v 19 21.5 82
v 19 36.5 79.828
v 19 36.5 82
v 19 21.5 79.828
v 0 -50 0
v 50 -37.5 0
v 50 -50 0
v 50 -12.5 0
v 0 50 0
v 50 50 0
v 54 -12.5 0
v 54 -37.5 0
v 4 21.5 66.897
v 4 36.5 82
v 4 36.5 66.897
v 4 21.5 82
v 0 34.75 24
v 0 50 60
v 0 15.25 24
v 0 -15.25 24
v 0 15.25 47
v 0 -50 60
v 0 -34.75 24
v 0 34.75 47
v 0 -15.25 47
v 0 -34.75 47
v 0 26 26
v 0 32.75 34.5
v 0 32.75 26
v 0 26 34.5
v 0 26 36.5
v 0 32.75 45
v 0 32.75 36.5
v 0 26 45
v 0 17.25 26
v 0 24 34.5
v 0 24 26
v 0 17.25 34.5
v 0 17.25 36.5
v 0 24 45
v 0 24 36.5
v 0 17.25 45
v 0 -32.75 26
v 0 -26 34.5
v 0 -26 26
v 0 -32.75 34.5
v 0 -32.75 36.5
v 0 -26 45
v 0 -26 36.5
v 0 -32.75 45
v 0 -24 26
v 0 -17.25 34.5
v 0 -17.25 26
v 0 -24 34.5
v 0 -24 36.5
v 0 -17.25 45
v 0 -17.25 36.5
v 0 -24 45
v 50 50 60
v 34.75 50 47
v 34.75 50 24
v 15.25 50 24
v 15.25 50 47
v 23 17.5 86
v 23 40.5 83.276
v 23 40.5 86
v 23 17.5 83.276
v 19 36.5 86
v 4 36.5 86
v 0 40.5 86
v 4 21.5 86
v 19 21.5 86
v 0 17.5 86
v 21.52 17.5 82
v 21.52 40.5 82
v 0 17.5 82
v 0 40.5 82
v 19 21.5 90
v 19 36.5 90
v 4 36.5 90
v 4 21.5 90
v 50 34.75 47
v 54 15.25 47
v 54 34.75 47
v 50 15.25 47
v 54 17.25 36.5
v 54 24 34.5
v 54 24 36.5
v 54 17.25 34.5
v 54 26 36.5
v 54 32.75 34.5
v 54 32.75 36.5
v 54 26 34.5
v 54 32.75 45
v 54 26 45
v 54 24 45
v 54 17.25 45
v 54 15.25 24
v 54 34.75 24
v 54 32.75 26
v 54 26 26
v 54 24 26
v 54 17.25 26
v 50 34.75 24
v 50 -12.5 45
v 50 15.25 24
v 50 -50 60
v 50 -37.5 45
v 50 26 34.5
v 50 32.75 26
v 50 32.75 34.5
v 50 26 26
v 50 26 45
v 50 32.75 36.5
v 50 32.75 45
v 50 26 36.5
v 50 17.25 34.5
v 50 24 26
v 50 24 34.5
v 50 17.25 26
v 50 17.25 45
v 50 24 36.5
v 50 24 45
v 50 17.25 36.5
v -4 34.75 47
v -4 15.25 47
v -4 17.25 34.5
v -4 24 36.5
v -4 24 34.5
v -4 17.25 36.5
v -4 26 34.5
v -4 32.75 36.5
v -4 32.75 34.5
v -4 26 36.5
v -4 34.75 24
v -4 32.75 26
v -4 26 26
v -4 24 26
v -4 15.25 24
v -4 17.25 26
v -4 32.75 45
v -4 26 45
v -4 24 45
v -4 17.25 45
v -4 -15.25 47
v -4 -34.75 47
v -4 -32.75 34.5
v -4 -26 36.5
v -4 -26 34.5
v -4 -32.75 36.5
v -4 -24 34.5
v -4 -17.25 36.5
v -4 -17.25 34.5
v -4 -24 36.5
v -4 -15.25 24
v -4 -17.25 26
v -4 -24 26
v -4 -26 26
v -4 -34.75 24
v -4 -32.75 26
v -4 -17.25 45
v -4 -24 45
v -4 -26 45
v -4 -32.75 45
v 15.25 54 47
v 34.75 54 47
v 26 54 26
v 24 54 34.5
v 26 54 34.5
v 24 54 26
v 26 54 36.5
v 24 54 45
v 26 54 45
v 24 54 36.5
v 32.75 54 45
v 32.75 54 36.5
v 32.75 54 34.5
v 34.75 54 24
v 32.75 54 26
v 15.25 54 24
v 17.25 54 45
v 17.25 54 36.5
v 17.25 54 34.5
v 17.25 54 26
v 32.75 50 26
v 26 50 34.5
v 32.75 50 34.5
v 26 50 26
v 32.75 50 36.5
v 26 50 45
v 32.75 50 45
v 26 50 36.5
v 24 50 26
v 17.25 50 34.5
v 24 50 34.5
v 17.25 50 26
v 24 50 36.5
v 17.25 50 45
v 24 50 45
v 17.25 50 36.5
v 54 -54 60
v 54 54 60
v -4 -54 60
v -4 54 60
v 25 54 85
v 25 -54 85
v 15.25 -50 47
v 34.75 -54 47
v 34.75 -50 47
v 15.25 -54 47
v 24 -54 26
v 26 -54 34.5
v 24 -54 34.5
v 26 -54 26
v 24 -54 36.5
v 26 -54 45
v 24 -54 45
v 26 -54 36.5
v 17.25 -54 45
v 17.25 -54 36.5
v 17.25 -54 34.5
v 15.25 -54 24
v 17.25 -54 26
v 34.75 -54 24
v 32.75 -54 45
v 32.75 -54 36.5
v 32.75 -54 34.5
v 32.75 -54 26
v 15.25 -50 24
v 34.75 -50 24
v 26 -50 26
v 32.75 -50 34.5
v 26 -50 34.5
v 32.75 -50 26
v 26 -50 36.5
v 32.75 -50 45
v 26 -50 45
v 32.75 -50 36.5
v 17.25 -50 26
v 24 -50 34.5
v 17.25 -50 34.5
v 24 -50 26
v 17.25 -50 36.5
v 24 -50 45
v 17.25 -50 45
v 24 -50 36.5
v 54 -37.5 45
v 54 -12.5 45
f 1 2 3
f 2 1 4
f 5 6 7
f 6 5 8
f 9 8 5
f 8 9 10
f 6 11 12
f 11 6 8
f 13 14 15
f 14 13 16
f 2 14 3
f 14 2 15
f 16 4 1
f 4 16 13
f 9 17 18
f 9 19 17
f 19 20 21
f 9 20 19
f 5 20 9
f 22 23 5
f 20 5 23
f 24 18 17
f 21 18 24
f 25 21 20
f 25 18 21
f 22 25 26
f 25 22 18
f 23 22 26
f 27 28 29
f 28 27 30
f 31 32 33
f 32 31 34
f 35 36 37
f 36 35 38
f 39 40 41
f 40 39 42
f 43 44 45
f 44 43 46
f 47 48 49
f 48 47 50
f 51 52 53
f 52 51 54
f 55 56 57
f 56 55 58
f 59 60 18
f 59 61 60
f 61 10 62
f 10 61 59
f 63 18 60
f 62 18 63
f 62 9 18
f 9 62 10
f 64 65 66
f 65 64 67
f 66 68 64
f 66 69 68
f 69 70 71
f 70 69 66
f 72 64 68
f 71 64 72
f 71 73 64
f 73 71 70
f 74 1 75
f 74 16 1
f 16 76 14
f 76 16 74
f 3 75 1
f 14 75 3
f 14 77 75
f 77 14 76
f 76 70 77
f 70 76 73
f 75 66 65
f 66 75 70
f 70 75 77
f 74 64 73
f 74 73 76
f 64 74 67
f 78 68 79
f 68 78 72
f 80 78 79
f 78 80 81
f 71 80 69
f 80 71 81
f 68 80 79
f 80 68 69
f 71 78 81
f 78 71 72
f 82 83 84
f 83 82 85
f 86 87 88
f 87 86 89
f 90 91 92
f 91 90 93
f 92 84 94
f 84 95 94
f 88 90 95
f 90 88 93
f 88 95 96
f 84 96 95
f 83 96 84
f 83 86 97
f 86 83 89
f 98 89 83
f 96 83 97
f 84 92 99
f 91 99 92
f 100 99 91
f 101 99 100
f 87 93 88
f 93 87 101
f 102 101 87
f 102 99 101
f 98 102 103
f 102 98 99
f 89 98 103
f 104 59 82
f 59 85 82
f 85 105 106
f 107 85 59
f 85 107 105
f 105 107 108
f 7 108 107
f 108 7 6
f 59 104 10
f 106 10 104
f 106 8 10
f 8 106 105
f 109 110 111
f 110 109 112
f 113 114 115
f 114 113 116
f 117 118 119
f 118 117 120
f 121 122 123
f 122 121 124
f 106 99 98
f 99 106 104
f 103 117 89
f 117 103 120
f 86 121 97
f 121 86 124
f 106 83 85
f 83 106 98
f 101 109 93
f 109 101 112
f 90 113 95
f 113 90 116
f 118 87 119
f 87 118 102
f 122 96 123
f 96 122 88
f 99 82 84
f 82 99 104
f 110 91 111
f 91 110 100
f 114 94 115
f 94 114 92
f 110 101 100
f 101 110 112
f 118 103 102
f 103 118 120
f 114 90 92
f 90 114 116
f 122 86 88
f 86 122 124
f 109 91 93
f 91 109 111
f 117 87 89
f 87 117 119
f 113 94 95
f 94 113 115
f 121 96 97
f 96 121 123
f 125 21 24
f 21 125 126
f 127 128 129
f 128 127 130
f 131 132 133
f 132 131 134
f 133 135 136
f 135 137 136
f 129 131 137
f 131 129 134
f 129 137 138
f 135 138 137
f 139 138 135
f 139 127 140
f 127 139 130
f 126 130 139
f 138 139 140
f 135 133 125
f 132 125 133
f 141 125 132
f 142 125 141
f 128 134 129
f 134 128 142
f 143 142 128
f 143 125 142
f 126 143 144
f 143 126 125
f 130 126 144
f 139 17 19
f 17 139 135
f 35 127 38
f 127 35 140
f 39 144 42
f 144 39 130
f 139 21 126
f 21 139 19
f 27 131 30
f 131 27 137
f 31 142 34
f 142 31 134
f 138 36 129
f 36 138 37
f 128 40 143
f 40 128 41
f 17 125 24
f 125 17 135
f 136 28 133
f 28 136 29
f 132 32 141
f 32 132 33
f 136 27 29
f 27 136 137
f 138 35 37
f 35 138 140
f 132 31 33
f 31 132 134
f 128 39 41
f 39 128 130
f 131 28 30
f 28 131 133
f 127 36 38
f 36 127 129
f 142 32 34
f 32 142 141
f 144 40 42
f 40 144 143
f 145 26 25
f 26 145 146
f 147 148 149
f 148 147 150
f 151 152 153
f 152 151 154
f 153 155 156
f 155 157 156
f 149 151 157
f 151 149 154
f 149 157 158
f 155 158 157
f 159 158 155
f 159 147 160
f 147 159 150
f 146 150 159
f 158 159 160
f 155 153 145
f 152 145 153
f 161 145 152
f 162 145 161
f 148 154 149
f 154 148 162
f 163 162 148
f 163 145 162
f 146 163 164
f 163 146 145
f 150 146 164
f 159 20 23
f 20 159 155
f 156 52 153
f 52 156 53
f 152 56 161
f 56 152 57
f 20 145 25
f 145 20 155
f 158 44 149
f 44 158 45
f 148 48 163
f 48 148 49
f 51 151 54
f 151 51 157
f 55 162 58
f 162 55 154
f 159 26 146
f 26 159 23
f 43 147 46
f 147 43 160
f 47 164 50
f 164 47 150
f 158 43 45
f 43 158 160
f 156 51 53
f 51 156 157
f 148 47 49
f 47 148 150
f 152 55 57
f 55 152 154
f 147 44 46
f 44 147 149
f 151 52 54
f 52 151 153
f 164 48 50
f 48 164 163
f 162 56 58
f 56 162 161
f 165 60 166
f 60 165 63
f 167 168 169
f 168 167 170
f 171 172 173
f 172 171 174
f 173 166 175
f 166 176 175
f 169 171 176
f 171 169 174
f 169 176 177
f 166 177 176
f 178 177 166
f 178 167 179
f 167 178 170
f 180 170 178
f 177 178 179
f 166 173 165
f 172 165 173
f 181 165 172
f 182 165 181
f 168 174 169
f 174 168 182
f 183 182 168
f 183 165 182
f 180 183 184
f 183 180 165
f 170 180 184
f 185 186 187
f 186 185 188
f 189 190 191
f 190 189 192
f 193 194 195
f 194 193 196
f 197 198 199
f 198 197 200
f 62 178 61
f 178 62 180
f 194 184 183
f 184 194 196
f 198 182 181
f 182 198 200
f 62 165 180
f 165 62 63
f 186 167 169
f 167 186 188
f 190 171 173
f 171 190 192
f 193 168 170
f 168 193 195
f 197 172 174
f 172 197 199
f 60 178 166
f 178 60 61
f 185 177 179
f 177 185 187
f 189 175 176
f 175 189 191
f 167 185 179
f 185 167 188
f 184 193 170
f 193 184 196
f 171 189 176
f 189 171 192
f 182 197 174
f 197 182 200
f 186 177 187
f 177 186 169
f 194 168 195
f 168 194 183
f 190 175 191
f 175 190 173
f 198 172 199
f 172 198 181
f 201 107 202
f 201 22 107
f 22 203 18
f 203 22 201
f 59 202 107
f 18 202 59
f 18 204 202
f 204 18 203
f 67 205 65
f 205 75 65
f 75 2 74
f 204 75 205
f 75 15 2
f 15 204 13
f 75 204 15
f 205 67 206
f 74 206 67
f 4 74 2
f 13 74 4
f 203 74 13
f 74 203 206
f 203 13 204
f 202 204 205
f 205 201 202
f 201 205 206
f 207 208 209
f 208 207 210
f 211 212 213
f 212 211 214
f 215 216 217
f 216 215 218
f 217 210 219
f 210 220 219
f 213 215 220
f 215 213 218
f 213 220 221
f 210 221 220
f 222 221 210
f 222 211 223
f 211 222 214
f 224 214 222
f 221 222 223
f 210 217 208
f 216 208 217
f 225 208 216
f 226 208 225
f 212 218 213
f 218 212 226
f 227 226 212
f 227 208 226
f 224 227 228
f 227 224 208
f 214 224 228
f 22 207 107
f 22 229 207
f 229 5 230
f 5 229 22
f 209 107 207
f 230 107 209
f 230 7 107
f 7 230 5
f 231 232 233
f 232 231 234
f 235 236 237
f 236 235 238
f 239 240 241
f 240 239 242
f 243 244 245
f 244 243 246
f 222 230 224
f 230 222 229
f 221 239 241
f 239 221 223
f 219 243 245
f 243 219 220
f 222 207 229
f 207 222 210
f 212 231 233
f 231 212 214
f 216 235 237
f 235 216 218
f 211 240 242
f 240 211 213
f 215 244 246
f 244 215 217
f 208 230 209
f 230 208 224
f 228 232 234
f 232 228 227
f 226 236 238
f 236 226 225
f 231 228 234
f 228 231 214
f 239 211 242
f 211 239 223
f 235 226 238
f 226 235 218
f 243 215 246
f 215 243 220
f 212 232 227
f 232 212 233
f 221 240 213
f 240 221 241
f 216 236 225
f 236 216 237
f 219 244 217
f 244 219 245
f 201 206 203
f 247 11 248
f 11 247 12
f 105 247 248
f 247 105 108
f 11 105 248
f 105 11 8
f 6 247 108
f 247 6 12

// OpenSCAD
/* [Global] */

/* [Dimension] */
// front part of house
house_length = 100; 
// side of house
house_width = 50; 
// height of house (excluding roof)
house_height = 60; 
// protrusion from walls (windows, doors, roof)
protrusion = 4;

/* [Roof] */
//height of roof
roof_height = 25;

/* [Chimney] */
// show or hide chimney
show_chimney = 1; // [0:false, 1:true]
// width/length of chimney 
chimney_thickness = 15;
//height of chimney from the floor
chimney_height = 90;
// [0:false, 1:true]
show_window_behind_chimney = 1;

/* [Window] */
//thickness of side window
window_thickness = 2;
// wall to window ratio
window_proportion = 0.35;
// offset of window from top of wall
window_height_offset = 0.4;

/* [Door] */
// wall to door ratio (for height)
door_height_proportion = 0.75;
// wall to door ratio (for width)
door_width_proportion = 0.5; 

/* [Params for Hollow house] */
// show inner details inside house
show_inner_details = 0; // [0:false, 1:true]
// thickness of the wall (only if show_inner_details)
wall_thickness = 4;  
// print the roof separately
separate_roof = 0; // [0:false, 1:true]
// show roof above house
show_roof = 1; // [0:false, 1:true]
// show floor 
show_floor = 1; // [0:false, 1:true]
// thickness of the floor
floor_thickness =1;
 
length = house_width;
thickness = house_length/2;
 
 
    
/*******************
* ROOF AND CHIMNEY *
*******************/ 
module small_triangle(){  
    
    offset(r=-wall_thickness)
    triangle();
    
}
module triangle (){ 
    polygon(points=
        [[0,-protrusion ],
        [0,length+protrusion ],
        [ roof_height, length/2]]); 
}
module base_roof(){
    translate([0,wall_thickness])
    square([wall_thickness, length-wall_thickness*2]);
}

/* //DEBUG ROOF 
color("Green")
 small_triangle();
color("Orange",0.2)
triangle();
color("Red",0.2)
base_roof();
*/
  
module roof(){
    color("Red" ,0.8)
    translate([house_height,0,0])
    if(show_inner_details ){
        difference(){
        linear_extrude (height = thickness+protrusion) 
            triangle(); 
        linear_extrude (height = thickness+protrusion-wall_thickness) 
            small_triangle(); 
        linear_extrude (height = thickness -wall_thickness*2) 
            base_roof();
        
       }
    }else{
        linear_extrude (height = thickness+protrusion){
            triangle();
        }
    }
}

module chimney_top(){ 
    offset  = (thickness - chimney_thickness)/2;

    translate([0,offset,0]){
        //chimney top protrusion
        translate([0,0,chimney_height - protrusion*2]) 
        cube([chimney_thickness+2*protrusion, 
        chimney_thickness+2*protrusion, 
        protrusion]); 
        
        //main chimney
        translate([protrusion, protrusion, house_height]) 
        cube([chimney_thickness,
            chimney_thickness,
            chimney_height-house_height]);  
    }    
     
}

module chimney_indoors(){
   difference(){     
         chimney_bottom(); 
         chimney_hole();
    }
   
}

module chimney_bottom(){ 
    offset  = (thickness - chimney_thickness)/2; 
    
    color("Green", 0.8) 
    translate([protrusion, protrusion+offset, 0]) 
    cube([chimney_thickness,chimney_thickness,house_height]);  
    
    translate([0,thickness - (chimney_thickness*2),0]){ 
    cube ([chimney_thickness + protrusion*2, chimney_thickness*2 , house_height/3 ]);  
    } 
}
 
module chimney_hole(){
    rotate([0,90,0])
    hull(){ 
        l = house_height/6;
        translate([-l-protrusion,
            thickness -(chimney_thickness*2) +protrusion,
            chimney_thickness +protrusion])
        {
            translate([0, l/2, 0])
            cylinder(d=l, h=protrusion*2);
            cube ([l,l,protrusion*2]) ;
        }
    }
}

/********
* WALLS *
********/  
module floor(){
    if(show_floor){
        translate([0,-house_length/2,0])
        cube([house_width, house_length, floor_thickness]);
    }
}

module wall(){
    
    if(show_inner_details){
        difference(){
            color( "Purple" ,0.6 ) {
            cube([house_height,length, thickness]);}
            
             
            color( "Green"   ) {
            translate([0, wall_thickness, 0])
            cube([house_height,length-2*wall_thickness, thickness-wall_thickness]);
            }
        }
    }else {
        color( "Purple" ,0.8 ) {
        cube([house_height,length, thickness]);} 
    }
}

/*******
* DOOR *
*******/ 

module door(){  
    mirror([0,1,0]) 
        translate ([length,(thickness -(door_width_proportion*thickness))/2,0])
    cube([ protrusion, 
        door_width_proportion*thickness,
        house_height * door_height_proportion ]);
}

/**************
*WINDOW MODULE*
***************/
 
//side offset 
function window_offset(wall_length, window_length) = 
        (wall_length - window_length)*0.5;

module window_v_bar(wall_length, wall_offset){ 
    length=wall_length *window_proportion + window_thickness ;
    translate([0,0, wall_offset]) {
    cube([ length , 
        window_thickness,
        protrusion]);  
    }
     
}
module window_h_bar(length, wall_offset){ 
    translate([0,0, wall_offset])
    cube([ window_thickness,
        length *window_proportion + window_thickness ,  
        protrusion]); 
}

module window_3_v_bars(length, wall_offset, spacing){
    window_v_bar(length, wall_offset);
    translate ([0,spacing*window_proportion*0.5, 0])
    window_v_bar(length, wall_offset);
    translate ([0,spacing*window_proportion, 0])
    window_v_bar(length, wall_offset);
}

module window_3_h_bars(length, wall_offset){ 
    window_h_bar(length, wall_offset);
    translate ([house_height*window_proportion*0.5, 0, 0])
    window_h_bar(length, wall_offset);
    translate ([house_height*window_proportion, 0, 0])
    window_h_bar(length, wall_offset);
} 
 
module window(offset, length){
    
    height_offset = window_height_offset * house_height; 
    window_length = length * window_proportion + window_thickness;
    length_offset = window_offset(length, window_length);
    
    translate([height_offset, length_offset, 0]){
        window_3_v_bars(house_height, offset, length);
        window_3_h_bars(length, offset); 
    }
}

module front_window(){
    mirror([0,0,1])
    rotate([0,90,0]){  
        window(length, thickness );
    }
}
module back_windows(){
    
    
color("Green")  
    
    translate([-protrusion,0,0])
    mirror([0,0,1])
    rotate([0,90,0])
        window(0, thickness );
    
    
    translate([-protrusion,0,0])
    mirror([0,1,0]) 
    mirror([0,0,1])
    rotate([0,90,0])
        window(0, thickness );
        
    if(!show_chimney || show_window_behind_chimney){
        
    translate([-protrusion,0,0])
    mirror([0,0,1])
    rotate([0,90,0])
        window(0, thickness );
    }
}

/*****************
* HOUSE ASSEMBLY *
*****************/  
module half_house(){    
    if(show_roof  ){
        roof();
    }
    
    if (separate_roof){
        
        translate([-house_height,-(house_width + 2* protrusion ), 0]){
            roof();  
        }
    }
    wall();
    window(thickness, length);
} 

module house_main(){  
    
    if(show_chimney){
        chimney_indoors(); 
        if (separate_roof){
             
            translate([-(house_width+protrusion*2),0,-house_height])
            chimney_top();
         
        }  
        if(show_roof){
             chimney_top();
        }
         
    }
    door();
    front_window();
    back_windows();
    rotate([-90,-90,0]){
        half_house();
        mirror([0,0,1]) half_house();
    } 
    
    floor();
}

house_main();
 
